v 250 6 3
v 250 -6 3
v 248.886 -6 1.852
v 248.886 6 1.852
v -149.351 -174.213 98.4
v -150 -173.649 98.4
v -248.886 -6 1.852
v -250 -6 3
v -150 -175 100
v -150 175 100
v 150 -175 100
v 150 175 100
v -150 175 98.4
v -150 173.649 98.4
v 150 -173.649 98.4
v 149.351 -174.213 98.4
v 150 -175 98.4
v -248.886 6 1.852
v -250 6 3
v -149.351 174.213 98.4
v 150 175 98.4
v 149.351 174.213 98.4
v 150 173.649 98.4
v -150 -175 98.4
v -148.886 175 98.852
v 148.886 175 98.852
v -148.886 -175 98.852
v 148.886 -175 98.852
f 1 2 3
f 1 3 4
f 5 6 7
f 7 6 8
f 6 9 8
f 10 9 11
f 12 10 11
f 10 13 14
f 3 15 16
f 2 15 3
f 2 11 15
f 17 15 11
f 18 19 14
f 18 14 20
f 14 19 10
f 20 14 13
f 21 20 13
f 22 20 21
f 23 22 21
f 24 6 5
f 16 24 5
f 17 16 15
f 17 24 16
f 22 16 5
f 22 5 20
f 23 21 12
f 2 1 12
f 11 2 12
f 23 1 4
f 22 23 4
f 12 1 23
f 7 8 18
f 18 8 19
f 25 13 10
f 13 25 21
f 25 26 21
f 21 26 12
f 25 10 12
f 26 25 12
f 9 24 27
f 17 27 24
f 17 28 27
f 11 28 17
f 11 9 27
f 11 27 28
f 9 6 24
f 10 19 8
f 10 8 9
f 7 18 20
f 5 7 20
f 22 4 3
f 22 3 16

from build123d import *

# Parameters (mm, degrees)
SKETCH001_W             = 300
SKETCH001_H             = 350
PAD001_DEPTH            = 1.6
PAD002_DEPTH            = 1.6
BODY001_PLACEMENT_ANGLE = 180


with BuildPart() as part:
    # Sketch001 → Pad001 (new body)
    with BuildSketch(Plane.XY):
        Rectangle(SKETCH001_W, SKETCH001_H)
    extrude(amount=PAD001_DEPTH)

    # Sketch002 (on Local_CS) → Pad002 (join)
    with BuildSketch(Plane(origin=(-150, 0, 0), x_dir=(0.717792, 0, -0.696258), z_dir=(0.696258, 0, 0.717792))):
        Polygon((0, -175), (0, 175), (-139.316187, 6), (-139.316187, -6), align=None)
    pad002 = extrude(amount=PAD002_DEPTH)

    # Mirrored: Pad002 across YZ
    add(pad002.mirror(Plane.YZ))


with BuildPart() as part_1:
    # Body001 placement: moved
    add(part.part.moved(Location((0, 0, 100))).rotate(Axis((0, 0, 100), (1, 0, 0)), BODY001_PLACEMENT_ANGLE))


solid = part_1.part
